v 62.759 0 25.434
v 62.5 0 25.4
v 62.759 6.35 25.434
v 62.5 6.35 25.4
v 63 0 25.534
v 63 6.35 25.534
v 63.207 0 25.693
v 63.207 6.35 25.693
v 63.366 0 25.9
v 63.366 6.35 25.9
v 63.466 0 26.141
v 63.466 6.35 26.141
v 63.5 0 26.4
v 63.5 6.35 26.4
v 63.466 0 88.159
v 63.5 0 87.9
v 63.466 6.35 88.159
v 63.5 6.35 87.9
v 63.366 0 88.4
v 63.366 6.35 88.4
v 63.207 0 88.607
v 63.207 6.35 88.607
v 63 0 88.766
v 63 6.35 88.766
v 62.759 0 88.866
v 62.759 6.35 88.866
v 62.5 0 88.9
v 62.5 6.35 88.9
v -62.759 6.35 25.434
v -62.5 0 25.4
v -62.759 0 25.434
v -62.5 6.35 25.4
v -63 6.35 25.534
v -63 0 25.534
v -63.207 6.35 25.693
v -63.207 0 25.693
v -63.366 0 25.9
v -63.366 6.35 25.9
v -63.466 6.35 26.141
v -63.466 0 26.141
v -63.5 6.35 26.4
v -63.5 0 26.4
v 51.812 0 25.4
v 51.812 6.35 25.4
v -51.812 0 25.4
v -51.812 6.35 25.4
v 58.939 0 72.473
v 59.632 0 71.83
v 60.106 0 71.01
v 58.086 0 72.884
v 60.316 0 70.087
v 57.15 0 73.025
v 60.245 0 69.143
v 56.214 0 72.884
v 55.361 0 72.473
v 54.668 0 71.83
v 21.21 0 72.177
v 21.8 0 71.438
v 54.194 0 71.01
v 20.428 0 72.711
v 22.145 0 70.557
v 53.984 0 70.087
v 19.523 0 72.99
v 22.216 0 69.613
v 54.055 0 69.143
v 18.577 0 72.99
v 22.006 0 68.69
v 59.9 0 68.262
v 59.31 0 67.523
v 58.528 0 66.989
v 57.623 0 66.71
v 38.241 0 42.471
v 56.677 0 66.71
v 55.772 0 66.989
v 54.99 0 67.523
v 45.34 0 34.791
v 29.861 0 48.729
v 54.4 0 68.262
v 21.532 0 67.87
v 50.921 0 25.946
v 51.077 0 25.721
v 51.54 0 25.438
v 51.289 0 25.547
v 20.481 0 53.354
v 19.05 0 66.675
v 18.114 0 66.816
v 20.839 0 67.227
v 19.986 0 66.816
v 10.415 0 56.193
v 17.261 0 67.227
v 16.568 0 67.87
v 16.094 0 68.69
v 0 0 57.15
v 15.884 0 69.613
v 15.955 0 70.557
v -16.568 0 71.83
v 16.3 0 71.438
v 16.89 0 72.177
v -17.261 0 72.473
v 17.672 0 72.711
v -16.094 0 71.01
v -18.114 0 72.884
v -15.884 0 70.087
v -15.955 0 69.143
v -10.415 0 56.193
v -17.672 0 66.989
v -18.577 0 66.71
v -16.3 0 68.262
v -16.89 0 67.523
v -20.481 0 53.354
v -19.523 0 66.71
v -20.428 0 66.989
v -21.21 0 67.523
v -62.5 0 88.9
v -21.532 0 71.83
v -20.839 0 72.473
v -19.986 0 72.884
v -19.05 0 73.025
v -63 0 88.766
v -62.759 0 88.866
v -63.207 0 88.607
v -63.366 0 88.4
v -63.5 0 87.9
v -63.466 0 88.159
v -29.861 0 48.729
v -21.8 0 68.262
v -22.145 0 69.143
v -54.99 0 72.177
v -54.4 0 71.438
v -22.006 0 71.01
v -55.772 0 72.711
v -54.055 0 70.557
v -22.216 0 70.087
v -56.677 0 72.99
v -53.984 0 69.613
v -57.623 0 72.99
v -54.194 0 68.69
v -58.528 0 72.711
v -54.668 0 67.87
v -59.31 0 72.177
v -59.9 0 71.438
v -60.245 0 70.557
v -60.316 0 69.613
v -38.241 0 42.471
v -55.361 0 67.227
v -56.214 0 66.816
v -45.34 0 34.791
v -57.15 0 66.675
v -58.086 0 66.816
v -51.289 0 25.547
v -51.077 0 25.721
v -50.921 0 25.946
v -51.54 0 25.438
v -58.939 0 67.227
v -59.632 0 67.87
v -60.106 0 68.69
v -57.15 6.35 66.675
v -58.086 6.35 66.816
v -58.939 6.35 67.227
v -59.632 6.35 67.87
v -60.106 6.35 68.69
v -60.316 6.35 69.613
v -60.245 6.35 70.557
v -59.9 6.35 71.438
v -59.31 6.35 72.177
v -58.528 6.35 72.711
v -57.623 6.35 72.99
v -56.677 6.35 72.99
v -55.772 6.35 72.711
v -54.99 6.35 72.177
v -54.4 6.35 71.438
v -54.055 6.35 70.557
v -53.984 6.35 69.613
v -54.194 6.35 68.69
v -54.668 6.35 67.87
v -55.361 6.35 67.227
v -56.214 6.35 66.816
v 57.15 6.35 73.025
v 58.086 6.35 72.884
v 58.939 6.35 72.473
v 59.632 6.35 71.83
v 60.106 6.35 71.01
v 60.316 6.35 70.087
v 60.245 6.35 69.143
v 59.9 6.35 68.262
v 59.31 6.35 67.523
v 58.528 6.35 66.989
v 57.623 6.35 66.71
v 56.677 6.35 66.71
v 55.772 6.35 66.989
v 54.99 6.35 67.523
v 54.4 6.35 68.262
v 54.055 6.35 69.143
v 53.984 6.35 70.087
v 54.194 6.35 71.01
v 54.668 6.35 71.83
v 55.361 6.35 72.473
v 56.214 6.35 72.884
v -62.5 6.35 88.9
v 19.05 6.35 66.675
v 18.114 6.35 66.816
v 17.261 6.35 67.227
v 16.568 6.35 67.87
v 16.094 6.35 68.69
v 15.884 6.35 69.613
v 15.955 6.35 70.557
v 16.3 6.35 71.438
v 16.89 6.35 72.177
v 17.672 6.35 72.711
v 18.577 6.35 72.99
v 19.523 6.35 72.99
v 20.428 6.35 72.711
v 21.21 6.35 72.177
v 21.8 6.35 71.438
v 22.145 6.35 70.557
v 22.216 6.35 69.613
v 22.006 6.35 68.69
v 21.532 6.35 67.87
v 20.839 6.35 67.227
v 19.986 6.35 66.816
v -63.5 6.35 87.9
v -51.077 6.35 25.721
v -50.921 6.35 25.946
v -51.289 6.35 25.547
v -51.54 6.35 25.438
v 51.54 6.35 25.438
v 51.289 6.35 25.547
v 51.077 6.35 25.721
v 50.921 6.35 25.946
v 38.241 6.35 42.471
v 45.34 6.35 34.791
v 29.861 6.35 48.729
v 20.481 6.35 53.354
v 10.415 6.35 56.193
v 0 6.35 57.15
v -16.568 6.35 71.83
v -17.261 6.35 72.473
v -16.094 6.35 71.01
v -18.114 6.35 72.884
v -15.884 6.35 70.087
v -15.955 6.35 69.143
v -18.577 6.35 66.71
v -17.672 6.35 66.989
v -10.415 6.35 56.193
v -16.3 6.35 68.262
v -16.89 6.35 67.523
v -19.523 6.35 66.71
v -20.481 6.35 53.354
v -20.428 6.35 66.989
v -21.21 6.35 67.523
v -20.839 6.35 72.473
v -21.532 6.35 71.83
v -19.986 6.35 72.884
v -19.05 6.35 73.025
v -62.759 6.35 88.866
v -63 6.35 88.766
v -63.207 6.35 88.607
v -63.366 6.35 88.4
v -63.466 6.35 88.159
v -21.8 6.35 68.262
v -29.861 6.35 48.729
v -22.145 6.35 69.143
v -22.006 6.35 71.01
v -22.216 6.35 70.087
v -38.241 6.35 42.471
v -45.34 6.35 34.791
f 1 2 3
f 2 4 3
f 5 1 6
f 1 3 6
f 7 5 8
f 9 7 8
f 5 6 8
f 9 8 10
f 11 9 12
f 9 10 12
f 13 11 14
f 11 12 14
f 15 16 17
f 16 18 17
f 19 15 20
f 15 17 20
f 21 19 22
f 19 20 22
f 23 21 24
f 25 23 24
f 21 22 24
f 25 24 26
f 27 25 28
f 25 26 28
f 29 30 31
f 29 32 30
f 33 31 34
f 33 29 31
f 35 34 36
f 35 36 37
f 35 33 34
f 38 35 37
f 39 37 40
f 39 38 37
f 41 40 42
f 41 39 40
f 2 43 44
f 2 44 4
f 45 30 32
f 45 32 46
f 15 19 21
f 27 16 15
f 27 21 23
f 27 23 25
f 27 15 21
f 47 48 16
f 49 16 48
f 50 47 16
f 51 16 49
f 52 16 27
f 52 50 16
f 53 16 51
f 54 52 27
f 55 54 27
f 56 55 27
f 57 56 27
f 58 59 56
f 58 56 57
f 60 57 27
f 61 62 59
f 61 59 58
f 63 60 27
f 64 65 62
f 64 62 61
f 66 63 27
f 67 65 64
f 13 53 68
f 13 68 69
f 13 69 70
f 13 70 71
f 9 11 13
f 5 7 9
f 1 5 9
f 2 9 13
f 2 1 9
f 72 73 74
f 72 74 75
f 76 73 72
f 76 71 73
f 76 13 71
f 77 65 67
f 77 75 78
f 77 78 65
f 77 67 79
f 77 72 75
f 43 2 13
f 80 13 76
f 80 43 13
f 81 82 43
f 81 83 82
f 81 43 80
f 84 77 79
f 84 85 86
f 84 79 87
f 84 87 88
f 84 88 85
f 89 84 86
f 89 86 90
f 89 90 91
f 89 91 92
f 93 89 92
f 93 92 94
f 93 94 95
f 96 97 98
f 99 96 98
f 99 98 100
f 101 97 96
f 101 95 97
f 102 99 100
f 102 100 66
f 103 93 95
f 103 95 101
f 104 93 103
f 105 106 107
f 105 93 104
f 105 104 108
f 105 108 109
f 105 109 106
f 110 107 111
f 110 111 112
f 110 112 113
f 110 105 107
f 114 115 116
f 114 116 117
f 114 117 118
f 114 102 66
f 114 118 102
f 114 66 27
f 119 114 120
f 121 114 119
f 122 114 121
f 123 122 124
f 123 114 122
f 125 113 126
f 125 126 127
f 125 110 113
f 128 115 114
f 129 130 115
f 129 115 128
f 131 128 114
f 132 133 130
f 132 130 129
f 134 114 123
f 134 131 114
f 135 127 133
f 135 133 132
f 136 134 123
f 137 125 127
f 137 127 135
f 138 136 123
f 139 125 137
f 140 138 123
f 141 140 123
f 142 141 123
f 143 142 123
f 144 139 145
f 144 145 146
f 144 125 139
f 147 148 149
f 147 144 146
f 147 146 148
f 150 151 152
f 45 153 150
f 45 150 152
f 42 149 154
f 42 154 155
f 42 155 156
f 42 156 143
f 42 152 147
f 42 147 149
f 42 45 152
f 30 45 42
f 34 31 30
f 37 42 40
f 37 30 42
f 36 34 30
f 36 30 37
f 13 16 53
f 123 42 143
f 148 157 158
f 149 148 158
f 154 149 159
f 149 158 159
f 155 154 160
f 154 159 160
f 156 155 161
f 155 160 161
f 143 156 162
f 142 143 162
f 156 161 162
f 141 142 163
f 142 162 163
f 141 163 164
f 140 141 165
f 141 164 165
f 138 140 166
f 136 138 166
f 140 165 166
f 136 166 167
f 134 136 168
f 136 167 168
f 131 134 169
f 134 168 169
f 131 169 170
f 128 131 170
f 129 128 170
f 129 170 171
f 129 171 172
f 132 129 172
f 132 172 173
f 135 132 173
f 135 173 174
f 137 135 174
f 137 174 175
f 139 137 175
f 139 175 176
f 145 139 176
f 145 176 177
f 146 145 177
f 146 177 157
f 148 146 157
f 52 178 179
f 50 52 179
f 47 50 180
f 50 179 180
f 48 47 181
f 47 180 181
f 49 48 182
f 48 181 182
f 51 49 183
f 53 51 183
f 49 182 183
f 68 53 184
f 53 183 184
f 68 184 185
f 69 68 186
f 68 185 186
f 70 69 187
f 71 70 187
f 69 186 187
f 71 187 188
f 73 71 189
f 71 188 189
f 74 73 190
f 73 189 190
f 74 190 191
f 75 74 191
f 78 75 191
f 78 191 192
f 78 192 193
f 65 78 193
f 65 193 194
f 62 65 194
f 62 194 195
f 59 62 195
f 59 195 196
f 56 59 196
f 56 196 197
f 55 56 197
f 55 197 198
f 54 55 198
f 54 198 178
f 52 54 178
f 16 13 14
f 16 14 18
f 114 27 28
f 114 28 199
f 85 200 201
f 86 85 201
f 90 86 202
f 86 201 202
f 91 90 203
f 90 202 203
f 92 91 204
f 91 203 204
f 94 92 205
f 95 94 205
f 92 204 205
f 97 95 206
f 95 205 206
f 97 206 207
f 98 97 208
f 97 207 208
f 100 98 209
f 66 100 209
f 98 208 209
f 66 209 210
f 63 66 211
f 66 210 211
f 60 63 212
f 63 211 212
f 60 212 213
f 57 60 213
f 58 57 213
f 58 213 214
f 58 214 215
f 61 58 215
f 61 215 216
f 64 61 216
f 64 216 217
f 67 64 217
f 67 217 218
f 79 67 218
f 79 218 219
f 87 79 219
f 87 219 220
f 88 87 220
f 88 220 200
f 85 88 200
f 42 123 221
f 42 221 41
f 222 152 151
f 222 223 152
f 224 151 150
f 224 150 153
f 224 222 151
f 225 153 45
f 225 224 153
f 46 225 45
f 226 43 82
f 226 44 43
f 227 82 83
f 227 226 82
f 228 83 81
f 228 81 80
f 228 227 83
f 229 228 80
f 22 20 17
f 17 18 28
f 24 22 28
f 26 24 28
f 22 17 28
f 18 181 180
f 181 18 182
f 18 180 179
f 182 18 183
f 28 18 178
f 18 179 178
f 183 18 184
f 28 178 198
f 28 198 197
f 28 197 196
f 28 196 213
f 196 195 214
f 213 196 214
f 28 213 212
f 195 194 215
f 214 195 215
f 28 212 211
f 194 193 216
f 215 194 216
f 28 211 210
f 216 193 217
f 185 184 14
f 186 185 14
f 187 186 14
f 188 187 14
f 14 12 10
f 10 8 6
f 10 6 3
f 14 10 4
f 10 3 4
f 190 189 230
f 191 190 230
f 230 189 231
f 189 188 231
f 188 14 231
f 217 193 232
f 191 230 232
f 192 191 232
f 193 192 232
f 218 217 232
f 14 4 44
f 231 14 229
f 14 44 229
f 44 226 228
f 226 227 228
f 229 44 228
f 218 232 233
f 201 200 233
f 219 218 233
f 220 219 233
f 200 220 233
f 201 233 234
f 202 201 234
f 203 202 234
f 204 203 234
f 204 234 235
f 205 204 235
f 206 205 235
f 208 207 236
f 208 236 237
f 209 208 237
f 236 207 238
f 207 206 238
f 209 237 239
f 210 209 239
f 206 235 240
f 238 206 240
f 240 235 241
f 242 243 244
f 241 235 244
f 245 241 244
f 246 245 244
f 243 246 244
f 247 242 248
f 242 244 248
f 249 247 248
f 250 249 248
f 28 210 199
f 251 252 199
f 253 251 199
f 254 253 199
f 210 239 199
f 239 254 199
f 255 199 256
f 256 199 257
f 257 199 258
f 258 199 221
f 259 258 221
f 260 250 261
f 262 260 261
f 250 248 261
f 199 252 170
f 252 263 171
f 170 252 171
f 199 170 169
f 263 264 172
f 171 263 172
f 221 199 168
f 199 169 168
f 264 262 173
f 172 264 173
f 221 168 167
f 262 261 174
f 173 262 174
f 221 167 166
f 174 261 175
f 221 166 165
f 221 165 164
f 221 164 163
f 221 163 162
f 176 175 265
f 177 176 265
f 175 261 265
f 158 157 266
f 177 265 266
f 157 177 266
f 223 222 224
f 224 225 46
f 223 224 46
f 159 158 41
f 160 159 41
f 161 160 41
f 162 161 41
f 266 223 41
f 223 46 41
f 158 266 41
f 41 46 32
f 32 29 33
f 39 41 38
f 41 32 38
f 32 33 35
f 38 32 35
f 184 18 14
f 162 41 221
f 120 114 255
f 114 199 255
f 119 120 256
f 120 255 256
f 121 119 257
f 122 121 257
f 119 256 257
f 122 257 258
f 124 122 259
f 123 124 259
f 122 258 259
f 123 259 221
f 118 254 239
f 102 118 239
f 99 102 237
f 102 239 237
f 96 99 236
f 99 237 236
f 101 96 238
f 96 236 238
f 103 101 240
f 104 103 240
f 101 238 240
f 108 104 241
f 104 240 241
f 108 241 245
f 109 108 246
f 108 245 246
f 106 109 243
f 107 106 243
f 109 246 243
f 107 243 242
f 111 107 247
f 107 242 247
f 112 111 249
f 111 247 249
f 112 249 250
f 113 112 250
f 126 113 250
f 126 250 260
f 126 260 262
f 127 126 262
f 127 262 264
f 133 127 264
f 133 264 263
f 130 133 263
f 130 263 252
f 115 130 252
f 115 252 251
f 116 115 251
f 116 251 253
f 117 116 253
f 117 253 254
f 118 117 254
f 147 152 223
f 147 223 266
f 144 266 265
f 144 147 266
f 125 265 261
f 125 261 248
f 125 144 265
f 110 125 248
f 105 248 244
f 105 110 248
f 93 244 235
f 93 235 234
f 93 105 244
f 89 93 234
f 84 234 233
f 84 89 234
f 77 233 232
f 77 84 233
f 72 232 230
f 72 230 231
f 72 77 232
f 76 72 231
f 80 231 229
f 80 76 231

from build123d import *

# Parameters (mm, degrees)
BOSS_EXTRUDE1_DEPTH = 6.35
SKETCH2_R           = 3.175
CUT_EXTRUDE1_DEPTH  = 110.433918417
FILLET1_R           = 1


with BuildPart() as part:
    # Sketch1 → Boss-Extrude1 (new body)
    with BuildSketch(Plane(origin=(0, 0, 0), x_dir=(1, 0, 0), z_dir=(0, 1, 0))):
        with BuildLine():
            Line((51.195336702, -25.4), (63.5, -25.4))
            Line((63.5, -25.4), (63.5, -88.9))
            Line((63.5, -88.9), (-63.5, -88.9))
            Line((-63.5, -88.9), (-63.5, -25.4))
            Line((-63.5, -25.4), (-51.195336702, -25.4))
            ThreePointArc((-51.195336702, -25.4), (0, -57.15), (51.195336702, -25.4))
        make_face()
    extrude(amount=BOSS_EXTRUDE1_DEPTH)

    # Sketch2 → Cut-Extrude1 (cut, through all)
    with BuildSketch(Plane(origin=(0, 6.35, 0), x_dir=(-1, 0, 0), z_dir=(0, 1, 0))):
        with Locations(Location((19.05, 69.85, 0), (0, 0, 90))):
            Circle(SKETCH2_R)
        with Locations(Location((-19.05, 69.85, 0), (0, 0, 270))):
            Circle(SKETCH2_R)
        with Locations(Location((-57.15, 69.85, 0), (0, 0, 90))):
            Circle(SKETCH2_R)
        with Locations(Location((57.15, 69.85, 0), (0, 0, 270))):
            Circle(SKETCH2_R)
    extrude(amount=-CUT_EXTRUDE1_DEPTH, mode=Mode.SUBTRACT)

    # Fillet1
    fillet1_edges = [part.edges().sort_by_distance(p)[0] for p in [
        (-63.5, 3.175, 25.4),
        (-51.195336702, 3.175, 25.4),
        (51.195336702, 3.175, 25.4),
        (63.5, 3.175, 25.4),
        (63.5, 3.175, 88.9),
        (-63.5, 3.175, 88.9),
    ]]
    fillet(fillet1_edges, radius=FILLET1_R)


solid = part.part
